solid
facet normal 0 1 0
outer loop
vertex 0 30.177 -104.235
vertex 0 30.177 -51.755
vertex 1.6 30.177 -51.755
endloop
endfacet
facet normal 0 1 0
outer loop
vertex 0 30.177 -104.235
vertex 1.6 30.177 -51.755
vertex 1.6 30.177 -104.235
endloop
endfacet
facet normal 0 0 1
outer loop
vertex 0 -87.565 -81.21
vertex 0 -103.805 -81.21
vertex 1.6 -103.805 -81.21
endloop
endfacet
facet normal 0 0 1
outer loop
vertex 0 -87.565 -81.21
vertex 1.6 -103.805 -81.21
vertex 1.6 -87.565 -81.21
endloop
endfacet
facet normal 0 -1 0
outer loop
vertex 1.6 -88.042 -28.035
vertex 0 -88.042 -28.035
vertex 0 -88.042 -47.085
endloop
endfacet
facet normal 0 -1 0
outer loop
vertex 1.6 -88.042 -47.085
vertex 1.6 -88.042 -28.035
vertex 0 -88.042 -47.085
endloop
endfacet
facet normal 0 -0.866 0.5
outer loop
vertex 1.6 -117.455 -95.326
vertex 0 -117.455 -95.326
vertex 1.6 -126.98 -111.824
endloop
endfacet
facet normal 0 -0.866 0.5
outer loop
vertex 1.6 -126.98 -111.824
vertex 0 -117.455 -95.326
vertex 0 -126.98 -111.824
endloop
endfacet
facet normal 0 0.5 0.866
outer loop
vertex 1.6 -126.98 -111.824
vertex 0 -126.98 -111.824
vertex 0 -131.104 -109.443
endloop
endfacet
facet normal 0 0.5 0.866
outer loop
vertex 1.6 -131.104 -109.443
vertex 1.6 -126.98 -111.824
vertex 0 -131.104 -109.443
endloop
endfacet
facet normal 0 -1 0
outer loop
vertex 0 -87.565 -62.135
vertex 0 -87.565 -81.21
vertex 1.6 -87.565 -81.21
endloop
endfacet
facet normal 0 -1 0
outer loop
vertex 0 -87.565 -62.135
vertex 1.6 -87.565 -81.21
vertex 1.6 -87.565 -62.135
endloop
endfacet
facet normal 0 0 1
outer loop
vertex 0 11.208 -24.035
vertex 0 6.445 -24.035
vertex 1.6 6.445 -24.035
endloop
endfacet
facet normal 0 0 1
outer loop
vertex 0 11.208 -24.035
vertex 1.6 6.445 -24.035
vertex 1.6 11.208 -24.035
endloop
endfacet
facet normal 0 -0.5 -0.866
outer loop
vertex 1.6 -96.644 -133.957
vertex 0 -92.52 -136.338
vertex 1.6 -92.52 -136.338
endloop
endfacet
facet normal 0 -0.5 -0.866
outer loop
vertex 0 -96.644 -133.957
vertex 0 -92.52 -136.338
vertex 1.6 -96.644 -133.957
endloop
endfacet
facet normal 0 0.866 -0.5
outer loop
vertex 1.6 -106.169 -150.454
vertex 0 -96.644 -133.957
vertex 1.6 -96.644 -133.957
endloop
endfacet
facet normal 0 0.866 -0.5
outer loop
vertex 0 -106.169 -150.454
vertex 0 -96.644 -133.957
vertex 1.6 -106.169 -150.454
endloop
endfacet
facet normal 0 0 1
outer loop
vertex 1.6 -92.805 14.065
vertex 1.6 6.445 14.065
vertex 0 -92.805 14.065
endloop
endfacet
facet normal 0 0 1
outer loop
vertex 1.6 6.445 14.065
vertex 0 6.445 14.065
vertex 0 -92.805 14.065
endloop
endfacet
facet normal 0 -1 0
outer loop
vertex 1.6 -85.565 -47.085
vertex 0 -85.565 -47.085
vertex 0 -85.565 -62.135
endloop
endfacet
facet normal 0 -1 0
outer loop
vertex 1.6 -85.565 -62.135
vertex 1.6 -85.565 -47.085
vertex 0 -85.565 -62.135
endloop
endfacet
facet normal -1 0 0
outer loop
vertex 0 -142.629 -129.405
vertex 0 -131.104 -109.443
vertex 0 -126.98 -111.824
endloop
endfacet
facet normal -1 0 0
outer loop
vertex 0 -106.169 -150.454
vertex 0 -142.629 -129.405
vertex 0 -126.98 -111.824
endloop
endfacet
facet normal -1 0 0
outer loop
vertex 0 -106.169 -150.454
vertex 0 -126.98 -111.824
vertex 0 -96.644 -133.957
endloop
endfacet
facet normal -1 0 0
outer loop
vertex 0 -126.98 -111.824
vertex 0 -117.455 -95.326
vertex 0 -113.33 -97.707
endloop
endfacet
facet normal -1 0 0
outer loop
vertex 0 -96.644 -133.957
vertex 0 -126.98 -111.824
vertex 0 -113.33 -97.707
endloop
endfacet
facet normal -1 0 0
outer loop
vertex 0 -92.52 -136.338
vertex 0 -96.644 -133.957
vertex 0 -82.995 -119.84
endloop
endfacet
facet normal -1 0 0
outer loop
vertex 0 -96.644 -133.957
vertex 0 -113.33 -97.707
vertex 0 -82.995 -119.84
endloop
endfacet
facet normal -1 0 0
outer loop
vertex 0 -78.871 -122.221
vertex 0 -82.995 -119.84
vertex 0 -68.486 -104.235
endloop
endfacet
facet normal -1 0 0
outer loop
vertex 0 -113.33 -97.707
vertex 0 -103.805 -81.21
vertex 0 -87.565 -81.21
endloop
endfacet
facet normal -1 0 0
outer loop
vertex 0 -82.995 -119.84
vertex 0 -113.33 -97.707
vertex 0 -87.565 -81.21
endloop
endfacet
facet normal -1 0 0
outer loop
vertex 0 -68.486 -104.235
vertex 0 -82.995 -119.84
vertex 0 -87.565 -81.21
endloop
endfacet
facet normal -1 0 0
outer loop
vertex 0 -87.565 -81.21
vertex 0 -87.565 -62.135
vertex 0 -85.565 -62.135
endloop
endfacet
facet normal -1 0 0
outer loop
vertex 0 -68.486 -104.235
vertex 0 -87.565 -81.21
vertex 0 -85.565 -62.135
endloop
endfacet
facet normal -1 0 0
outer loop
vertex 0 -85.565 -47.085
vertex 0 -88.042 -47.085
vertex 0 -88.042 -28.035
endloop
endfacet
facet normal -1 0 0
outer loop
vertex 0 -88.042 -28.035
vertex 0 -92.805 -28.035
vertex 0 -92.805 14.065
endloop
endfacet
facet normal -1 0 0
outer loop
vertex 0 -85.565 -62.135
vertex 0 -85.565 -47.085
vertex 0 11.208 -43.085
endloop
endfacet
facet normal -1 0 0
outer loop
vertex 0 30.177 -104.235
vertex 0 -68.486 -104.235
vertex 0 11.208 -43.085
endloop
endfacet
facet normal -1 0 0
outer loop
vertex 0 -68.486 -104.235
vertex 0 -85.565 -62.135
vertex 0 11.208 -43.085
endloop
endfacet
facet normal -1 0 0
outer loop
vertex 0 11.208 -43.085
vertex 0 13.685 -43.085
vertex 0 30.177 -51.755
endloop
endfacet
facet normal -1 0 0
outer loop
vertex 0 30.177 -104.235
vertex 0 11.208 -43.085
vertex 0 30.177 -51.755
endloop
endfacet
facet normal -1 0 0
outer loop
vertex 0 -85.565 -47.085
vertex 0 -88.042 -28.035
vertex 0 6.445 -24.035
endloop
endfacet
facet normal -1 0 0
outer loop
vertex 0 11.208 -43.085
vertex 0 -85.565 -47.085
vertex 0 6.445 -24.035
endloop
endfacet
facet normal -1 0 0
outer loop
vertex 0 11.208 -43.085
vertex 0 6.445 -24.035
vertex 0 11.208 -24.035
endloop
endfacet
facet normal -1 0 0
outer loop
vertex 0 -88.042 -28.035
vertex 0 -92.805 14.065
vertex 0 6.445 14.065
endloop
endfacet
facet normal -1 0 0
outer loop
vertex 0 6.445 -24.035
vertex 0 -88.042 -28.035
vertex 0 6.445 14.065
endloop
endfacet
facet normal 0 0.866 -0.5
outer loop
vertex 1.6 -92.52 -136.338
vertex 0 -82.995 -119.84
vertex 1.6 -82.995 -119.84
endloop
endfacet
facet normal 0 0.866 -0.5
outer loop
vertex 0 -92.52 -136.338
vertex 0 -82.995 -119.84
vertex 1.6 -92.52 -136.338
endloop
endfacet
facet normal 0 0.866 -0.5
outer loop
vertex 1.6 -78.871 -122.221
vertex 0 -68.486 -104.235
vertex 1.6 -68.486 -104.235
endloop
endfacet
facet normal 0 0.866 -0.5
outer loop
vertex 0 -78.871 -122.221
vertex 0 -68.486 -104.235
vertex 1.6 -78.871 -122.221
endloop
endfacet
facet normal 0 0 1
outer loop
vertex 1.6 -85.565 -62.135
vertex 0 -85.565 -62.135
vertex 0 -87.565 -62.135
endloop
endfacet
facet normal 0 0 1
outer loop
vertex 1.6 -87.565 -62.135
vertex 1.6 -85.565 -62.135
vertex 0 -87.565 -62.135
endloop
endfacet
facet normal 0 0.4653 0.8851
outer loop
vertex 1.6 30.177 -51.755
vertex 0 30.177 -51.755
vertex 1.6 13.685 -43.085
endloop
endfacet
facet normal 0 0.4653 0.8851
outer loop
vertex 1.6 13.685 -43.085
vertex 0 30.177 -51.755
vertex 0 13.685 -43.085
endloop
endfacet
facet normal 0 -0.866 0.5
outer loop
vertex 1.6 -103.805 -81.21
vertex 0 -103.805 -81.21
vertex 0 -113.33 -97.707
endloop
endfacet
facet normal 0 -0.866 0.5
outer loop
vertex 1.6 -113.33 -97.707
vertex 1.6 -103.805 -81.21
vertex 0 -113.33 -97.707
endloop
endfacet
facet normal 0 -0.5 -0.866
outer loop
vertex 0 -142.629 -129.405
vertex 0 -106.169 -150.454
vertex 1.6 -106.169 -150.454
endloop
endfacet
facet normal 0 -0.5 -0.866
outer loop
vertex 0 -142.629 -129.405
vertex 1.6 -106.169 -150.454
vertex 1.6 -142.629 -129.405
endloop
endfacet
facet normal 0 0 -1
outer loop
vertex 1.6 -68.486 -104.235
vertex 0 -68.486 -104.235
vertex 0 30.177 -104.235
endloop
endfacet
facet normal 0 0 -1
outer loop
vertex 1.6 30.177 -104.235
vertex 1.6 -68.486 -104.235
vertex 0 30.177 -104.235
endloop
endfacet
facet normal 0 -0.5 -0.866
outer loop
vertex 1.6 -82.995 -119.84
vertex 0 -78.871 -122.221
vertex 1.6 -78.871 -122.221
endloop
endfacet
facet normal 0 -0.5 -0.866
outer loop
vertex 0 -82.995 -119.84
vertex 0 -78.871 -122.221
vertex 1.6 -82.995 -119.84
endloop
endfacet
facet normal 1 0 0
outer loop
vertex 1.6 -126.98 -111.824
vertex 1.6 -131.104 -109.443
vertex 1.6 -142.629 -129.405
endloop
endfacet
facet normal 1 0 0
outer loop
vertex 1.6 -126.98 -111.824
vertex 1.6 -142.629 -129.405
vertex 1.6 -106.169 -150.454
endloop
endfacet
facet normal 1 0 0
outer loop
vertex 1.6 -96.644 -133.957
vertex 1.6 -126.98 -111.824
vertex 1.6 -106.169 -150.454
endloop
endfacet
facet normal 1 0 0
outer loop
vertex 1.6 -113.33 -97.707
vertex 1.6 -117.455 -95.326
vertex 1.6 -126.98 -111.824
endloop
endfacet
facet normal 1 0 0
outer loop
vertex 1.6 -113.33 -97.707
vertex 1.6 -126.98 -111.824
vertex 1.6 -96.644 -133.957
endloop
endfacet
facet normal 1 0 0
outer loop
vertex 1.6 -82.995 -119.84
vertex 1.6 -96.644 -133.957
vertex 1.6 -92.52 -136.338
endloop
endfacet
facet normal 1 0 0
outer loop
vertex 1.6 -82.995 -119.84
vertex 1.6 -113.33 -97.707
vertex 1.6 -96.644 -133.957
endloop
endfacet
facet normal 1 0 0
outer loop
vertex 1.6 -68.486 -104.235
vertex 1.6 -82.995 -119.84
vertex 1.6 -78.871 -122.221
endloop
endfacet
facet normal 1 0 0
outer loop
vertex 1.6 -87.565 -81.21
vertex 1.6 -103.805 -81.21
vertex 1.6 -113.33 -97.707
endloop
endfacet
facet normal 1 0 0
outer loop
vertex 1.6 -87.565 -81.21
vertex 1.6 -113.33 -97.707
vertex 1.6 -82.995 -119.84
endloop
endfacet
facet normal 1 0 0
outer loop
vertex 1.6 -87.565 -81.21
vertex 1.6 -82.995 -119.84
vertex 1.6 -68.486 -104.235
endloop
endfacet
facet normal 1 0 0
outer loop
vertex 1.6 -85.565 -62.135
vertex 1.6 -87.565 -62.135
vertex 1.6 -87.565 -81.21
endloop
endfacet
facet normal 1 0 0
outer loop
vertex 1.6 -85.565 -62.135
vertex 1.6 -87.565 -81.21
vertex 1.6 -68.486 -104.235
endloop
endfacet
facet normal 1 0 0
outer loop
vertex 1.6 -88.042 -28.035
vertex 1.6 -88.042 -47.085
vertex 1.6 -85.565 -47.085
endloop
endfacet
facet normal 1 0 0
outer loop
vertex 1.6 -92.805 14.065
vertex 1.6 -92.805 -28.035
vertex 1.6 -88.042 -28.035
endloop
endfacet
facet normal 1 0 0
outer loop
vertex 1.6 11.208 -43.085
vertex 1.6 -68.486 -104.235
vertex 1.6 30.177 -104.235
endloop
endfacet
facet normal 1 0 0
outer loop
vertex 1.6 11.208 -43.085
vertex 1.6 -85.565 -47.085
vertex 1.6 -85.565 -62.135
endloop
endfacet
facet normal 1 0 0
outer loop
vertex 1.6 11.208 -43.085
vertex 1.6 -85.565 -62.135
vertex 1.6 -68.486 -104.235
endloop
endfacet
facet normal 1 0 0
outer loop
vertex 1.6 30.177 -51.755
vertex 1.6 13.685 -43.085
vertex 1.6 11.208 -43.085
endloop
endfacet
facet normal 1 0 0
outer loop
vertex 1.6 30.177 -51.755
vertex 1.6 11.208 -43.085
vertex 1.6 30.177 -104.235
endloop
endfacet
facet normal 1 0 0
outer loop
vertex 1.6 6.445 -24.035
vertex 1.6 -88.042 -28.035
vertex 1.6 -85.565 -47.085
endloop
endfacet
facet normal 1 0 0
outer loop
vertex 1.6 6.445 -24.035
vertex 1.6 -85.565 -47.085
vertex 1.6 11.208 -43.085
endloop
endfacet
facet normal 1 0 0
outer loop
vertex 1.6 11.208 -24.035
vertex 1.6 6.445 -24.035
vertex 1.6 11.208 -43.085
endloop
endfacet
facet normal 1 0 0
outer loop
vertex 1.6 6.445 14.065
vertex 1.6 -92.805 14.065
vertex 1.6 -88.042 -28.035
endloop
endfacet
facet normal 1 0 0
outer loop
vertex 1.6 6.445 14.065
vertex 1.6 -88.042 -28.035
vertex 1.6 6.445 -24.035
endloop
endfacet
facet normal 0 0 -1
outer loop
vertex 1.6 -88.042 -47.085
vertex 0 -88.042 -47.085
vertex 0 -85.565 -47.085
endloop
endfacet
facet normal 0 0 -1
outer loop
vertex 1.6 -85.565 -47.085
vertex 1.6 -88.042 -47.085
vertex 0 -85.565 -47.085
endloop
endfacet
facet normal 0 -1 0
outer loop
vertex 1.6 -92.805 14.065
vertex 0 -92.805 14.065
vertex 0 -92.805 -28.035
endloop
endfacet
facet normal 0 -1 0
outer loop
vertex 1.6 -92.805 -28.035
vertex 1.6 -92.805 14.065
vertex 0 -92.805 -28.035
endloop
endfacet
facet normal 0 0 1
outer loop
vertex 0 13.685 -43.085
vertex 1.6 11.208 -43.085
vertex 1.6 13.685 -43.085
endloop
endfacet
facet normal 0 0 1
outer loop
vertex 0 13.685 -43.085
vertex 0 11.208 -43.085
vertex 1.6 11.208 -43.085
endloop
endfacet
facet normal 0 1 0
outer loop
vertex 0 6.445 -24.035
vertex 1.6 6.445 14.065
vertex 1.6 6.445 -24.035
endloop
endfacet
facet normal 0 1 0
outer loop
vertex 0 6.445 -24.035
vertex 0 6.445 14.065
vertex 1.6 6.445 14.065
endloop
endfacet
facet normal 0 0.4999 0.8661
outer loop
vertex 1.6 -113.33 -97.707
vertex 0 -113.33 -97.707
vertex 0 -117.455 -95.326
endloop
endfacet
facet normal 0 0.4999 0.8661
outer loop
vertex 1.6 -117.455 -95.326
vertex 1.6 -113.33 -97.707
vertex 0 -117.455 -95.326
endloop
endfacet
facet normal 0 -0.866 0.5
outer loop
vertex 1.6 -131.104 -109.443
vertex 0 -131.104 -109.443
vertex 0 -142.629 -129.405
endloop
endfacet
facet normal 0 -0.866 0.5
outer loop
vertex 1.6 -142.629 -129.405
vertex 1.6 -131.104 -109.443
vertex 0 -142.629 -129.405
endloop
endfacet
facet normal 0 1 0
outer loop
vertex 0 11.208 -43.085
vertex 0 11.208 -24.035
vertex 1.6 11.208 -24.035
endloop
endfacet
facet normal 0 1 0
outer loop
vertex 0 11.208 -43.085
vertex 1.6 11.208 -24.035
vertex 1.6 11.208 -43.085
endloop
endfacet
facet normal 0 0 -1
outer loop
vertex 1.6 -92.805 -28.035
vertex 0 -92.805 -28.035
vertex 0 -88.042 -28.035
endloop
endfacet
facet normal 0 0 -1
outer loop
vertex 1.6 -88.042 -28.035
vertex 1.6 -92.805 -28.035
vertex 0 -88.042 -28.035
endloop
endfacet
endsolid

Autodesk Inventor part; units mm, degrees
ref_plane "YZ Plane" through (0, 0, 0) normal (1, 0, 0) x (0, 1, 0)
ref_plane "XZ Plane" through (0, 0, 0) normal (0, 1, 0) x (-1, 0, 0)
ref_plane "XY Plane" through (0, 0, 0) normal (0, 0, 1) x (1, 0, 0)
sketch "Key" plane through (0, 0, 0) normal (0, 0, 1) x (1, 0, 0)
  line L0 (-9.525, 9.525) -> (9.525, 9.525) construction
  line L1 (9.525, 9.525) -> (9.525, -9.525) construction
  line L2 (9.525, -9.525) -> (-9.525, -9.525) construction
  line L3 (-9.525, -9.525) -> (-9.525, 9.525) construction
  line L4 (-9.525, 9.525) -> (9.525, -9.525) construction
  line L5 (9.525, 9.525) -> (-9.525, -9.525) construction
  point P0 (0, 0)
  point P1 (0, 0)
  dimension "d6" = 19.05
  dimension "d7" = 19.05
sketch "Col5" plane through (0, 0, 0) normal (0, 0, 1) x (1, 0, 0)
  point P0 (-10.8651, 0)
sketch "Col4" plane through (0, 0, 0) normal (0, 0, 1) x (1, 0, 0)
  point P0 (-10.8651, 0)
sketch "TC" plane through (0, 0, 0) normal (0, 0, 1) x (1, 0, 0)
  point P0 (-22.1335, 152.0917)
  dimension "d12" = 4.7625
  dimension "d13" = 4.7625
  dimension "d14" = 19.6363
sketch "Esquisse1" plane through (0, 0, 0) normal (1, 0, 0) x (0, 1, 0)
  line L0 (28.177, -71.755) -> (10.397, -71.755) construction
  line L1 (10.397, -71.755) -> (10.397, -102.235) construction
  line L2 (10.397, -102.235) -> (28.177, -102.235)
  line L3 (28.177, -102.235) -> (28.177, -71.755) construction
  line L4 (28.177, -71.755) -> (10.397, -102.235) construction
  line L5 (10.397, -71.755) -> (28.177, -102.235) construction
  line L6 (6.445, 14.065) -> (-92.805, 14.065)
  line L7 (6.445, 14.065) -> (6.445, -24.035)
  line L8 (-68.4861, -104.235) -> (30.177, -104.235)
  line L9 (30.177, -51.755) -> (30.177, -104.235)
  line L10 (-106.1694, -150.4545) -> (-142.6291, -129.4045)
  line L11 (-103.8052, -81.2096) -> (-113.3302, -97.7073)
  line L12 (-113.3302, -97.7073) -> (-117.4547, -95.3261)
  line L13 (-117.4547, -95.3261) -> (-126.9797, -111.8239)
  line L14 (-126.9797, -111.8239) -> (-131.1041, -109.4426)
  line L15 (-131.1041, -109.4426) -> (-142.6291, -129.4045)
  line L16 (-68.4861, -104.235) -> (-78.8706, -122.2214)
  line L17 (-78.8706, -122.2214) -> (-82.995, -119.8402)
  line L18 (-82.995, -119.8402) -> (-92.52, -136.338)
  line L19 (-92.52, -136.338) -> (-96.6444, -133.9567)
  line L20 (-96.6444, -133.9567) -> (-106.1694, -150.4545)
  line L21 (-92.805, 14.065) -> (-92.805, -28.035)
  line L22 (-92.805, -28.035) -> (-88.042, -28.035)
  line L23 (-88.042, -28.035) -> (-88.042, -47.085)
  line L24 (-88.042, -47.085) -> (-85.565, -47.085)
  line L25 (-85.565, -47.085) -> (-85.565, -62.135)
  line L26 (-85.565, -62.135) -> (-87.565, -62.135)
  line L27 (-89.5164, -89.4592) -> (-103.8052, -81.2096) construction
  line L28 (6.445, -24.035) -> (11.208, -24.035)
  line L29 (11.208, -24.035) -> (11.208, -43.085)
  line L30 (11.208, -43.085) -> (13.685, -43.085)
  line L31 (30.177, -51.755) -> (13.685, -43.085)
  line L32 (-78.8706, -122.2214) -> (-92.52, -136.338) construction
  line L33 (-92.52, -136.338) -> (-106.1694, -150.4545) construction
  line L34 (-103.8052, -81.2096) -> (-117.4547, -95.3261) construction
  line L35 (-131.1041, -109.4426) -> (-117.4547, -95.3261) construction
  line L36 (-103.8052, -81.2096) -> (-87.565, -81.2096)
  line L37 (-87.565, -81.2096) -> (-87.565, -62.135)
  point P0 (-5.08, 2.54)
  point P1 (19.287, -86.995)
  point P2 (-5.08, 2.54)
  point P3 (-86.042, -35.56)
  point P4 (0, 0)
extrude "Extrusion1" add sketch "Esquisse1" along normal blind 1.6
properties part number "board-profile"
